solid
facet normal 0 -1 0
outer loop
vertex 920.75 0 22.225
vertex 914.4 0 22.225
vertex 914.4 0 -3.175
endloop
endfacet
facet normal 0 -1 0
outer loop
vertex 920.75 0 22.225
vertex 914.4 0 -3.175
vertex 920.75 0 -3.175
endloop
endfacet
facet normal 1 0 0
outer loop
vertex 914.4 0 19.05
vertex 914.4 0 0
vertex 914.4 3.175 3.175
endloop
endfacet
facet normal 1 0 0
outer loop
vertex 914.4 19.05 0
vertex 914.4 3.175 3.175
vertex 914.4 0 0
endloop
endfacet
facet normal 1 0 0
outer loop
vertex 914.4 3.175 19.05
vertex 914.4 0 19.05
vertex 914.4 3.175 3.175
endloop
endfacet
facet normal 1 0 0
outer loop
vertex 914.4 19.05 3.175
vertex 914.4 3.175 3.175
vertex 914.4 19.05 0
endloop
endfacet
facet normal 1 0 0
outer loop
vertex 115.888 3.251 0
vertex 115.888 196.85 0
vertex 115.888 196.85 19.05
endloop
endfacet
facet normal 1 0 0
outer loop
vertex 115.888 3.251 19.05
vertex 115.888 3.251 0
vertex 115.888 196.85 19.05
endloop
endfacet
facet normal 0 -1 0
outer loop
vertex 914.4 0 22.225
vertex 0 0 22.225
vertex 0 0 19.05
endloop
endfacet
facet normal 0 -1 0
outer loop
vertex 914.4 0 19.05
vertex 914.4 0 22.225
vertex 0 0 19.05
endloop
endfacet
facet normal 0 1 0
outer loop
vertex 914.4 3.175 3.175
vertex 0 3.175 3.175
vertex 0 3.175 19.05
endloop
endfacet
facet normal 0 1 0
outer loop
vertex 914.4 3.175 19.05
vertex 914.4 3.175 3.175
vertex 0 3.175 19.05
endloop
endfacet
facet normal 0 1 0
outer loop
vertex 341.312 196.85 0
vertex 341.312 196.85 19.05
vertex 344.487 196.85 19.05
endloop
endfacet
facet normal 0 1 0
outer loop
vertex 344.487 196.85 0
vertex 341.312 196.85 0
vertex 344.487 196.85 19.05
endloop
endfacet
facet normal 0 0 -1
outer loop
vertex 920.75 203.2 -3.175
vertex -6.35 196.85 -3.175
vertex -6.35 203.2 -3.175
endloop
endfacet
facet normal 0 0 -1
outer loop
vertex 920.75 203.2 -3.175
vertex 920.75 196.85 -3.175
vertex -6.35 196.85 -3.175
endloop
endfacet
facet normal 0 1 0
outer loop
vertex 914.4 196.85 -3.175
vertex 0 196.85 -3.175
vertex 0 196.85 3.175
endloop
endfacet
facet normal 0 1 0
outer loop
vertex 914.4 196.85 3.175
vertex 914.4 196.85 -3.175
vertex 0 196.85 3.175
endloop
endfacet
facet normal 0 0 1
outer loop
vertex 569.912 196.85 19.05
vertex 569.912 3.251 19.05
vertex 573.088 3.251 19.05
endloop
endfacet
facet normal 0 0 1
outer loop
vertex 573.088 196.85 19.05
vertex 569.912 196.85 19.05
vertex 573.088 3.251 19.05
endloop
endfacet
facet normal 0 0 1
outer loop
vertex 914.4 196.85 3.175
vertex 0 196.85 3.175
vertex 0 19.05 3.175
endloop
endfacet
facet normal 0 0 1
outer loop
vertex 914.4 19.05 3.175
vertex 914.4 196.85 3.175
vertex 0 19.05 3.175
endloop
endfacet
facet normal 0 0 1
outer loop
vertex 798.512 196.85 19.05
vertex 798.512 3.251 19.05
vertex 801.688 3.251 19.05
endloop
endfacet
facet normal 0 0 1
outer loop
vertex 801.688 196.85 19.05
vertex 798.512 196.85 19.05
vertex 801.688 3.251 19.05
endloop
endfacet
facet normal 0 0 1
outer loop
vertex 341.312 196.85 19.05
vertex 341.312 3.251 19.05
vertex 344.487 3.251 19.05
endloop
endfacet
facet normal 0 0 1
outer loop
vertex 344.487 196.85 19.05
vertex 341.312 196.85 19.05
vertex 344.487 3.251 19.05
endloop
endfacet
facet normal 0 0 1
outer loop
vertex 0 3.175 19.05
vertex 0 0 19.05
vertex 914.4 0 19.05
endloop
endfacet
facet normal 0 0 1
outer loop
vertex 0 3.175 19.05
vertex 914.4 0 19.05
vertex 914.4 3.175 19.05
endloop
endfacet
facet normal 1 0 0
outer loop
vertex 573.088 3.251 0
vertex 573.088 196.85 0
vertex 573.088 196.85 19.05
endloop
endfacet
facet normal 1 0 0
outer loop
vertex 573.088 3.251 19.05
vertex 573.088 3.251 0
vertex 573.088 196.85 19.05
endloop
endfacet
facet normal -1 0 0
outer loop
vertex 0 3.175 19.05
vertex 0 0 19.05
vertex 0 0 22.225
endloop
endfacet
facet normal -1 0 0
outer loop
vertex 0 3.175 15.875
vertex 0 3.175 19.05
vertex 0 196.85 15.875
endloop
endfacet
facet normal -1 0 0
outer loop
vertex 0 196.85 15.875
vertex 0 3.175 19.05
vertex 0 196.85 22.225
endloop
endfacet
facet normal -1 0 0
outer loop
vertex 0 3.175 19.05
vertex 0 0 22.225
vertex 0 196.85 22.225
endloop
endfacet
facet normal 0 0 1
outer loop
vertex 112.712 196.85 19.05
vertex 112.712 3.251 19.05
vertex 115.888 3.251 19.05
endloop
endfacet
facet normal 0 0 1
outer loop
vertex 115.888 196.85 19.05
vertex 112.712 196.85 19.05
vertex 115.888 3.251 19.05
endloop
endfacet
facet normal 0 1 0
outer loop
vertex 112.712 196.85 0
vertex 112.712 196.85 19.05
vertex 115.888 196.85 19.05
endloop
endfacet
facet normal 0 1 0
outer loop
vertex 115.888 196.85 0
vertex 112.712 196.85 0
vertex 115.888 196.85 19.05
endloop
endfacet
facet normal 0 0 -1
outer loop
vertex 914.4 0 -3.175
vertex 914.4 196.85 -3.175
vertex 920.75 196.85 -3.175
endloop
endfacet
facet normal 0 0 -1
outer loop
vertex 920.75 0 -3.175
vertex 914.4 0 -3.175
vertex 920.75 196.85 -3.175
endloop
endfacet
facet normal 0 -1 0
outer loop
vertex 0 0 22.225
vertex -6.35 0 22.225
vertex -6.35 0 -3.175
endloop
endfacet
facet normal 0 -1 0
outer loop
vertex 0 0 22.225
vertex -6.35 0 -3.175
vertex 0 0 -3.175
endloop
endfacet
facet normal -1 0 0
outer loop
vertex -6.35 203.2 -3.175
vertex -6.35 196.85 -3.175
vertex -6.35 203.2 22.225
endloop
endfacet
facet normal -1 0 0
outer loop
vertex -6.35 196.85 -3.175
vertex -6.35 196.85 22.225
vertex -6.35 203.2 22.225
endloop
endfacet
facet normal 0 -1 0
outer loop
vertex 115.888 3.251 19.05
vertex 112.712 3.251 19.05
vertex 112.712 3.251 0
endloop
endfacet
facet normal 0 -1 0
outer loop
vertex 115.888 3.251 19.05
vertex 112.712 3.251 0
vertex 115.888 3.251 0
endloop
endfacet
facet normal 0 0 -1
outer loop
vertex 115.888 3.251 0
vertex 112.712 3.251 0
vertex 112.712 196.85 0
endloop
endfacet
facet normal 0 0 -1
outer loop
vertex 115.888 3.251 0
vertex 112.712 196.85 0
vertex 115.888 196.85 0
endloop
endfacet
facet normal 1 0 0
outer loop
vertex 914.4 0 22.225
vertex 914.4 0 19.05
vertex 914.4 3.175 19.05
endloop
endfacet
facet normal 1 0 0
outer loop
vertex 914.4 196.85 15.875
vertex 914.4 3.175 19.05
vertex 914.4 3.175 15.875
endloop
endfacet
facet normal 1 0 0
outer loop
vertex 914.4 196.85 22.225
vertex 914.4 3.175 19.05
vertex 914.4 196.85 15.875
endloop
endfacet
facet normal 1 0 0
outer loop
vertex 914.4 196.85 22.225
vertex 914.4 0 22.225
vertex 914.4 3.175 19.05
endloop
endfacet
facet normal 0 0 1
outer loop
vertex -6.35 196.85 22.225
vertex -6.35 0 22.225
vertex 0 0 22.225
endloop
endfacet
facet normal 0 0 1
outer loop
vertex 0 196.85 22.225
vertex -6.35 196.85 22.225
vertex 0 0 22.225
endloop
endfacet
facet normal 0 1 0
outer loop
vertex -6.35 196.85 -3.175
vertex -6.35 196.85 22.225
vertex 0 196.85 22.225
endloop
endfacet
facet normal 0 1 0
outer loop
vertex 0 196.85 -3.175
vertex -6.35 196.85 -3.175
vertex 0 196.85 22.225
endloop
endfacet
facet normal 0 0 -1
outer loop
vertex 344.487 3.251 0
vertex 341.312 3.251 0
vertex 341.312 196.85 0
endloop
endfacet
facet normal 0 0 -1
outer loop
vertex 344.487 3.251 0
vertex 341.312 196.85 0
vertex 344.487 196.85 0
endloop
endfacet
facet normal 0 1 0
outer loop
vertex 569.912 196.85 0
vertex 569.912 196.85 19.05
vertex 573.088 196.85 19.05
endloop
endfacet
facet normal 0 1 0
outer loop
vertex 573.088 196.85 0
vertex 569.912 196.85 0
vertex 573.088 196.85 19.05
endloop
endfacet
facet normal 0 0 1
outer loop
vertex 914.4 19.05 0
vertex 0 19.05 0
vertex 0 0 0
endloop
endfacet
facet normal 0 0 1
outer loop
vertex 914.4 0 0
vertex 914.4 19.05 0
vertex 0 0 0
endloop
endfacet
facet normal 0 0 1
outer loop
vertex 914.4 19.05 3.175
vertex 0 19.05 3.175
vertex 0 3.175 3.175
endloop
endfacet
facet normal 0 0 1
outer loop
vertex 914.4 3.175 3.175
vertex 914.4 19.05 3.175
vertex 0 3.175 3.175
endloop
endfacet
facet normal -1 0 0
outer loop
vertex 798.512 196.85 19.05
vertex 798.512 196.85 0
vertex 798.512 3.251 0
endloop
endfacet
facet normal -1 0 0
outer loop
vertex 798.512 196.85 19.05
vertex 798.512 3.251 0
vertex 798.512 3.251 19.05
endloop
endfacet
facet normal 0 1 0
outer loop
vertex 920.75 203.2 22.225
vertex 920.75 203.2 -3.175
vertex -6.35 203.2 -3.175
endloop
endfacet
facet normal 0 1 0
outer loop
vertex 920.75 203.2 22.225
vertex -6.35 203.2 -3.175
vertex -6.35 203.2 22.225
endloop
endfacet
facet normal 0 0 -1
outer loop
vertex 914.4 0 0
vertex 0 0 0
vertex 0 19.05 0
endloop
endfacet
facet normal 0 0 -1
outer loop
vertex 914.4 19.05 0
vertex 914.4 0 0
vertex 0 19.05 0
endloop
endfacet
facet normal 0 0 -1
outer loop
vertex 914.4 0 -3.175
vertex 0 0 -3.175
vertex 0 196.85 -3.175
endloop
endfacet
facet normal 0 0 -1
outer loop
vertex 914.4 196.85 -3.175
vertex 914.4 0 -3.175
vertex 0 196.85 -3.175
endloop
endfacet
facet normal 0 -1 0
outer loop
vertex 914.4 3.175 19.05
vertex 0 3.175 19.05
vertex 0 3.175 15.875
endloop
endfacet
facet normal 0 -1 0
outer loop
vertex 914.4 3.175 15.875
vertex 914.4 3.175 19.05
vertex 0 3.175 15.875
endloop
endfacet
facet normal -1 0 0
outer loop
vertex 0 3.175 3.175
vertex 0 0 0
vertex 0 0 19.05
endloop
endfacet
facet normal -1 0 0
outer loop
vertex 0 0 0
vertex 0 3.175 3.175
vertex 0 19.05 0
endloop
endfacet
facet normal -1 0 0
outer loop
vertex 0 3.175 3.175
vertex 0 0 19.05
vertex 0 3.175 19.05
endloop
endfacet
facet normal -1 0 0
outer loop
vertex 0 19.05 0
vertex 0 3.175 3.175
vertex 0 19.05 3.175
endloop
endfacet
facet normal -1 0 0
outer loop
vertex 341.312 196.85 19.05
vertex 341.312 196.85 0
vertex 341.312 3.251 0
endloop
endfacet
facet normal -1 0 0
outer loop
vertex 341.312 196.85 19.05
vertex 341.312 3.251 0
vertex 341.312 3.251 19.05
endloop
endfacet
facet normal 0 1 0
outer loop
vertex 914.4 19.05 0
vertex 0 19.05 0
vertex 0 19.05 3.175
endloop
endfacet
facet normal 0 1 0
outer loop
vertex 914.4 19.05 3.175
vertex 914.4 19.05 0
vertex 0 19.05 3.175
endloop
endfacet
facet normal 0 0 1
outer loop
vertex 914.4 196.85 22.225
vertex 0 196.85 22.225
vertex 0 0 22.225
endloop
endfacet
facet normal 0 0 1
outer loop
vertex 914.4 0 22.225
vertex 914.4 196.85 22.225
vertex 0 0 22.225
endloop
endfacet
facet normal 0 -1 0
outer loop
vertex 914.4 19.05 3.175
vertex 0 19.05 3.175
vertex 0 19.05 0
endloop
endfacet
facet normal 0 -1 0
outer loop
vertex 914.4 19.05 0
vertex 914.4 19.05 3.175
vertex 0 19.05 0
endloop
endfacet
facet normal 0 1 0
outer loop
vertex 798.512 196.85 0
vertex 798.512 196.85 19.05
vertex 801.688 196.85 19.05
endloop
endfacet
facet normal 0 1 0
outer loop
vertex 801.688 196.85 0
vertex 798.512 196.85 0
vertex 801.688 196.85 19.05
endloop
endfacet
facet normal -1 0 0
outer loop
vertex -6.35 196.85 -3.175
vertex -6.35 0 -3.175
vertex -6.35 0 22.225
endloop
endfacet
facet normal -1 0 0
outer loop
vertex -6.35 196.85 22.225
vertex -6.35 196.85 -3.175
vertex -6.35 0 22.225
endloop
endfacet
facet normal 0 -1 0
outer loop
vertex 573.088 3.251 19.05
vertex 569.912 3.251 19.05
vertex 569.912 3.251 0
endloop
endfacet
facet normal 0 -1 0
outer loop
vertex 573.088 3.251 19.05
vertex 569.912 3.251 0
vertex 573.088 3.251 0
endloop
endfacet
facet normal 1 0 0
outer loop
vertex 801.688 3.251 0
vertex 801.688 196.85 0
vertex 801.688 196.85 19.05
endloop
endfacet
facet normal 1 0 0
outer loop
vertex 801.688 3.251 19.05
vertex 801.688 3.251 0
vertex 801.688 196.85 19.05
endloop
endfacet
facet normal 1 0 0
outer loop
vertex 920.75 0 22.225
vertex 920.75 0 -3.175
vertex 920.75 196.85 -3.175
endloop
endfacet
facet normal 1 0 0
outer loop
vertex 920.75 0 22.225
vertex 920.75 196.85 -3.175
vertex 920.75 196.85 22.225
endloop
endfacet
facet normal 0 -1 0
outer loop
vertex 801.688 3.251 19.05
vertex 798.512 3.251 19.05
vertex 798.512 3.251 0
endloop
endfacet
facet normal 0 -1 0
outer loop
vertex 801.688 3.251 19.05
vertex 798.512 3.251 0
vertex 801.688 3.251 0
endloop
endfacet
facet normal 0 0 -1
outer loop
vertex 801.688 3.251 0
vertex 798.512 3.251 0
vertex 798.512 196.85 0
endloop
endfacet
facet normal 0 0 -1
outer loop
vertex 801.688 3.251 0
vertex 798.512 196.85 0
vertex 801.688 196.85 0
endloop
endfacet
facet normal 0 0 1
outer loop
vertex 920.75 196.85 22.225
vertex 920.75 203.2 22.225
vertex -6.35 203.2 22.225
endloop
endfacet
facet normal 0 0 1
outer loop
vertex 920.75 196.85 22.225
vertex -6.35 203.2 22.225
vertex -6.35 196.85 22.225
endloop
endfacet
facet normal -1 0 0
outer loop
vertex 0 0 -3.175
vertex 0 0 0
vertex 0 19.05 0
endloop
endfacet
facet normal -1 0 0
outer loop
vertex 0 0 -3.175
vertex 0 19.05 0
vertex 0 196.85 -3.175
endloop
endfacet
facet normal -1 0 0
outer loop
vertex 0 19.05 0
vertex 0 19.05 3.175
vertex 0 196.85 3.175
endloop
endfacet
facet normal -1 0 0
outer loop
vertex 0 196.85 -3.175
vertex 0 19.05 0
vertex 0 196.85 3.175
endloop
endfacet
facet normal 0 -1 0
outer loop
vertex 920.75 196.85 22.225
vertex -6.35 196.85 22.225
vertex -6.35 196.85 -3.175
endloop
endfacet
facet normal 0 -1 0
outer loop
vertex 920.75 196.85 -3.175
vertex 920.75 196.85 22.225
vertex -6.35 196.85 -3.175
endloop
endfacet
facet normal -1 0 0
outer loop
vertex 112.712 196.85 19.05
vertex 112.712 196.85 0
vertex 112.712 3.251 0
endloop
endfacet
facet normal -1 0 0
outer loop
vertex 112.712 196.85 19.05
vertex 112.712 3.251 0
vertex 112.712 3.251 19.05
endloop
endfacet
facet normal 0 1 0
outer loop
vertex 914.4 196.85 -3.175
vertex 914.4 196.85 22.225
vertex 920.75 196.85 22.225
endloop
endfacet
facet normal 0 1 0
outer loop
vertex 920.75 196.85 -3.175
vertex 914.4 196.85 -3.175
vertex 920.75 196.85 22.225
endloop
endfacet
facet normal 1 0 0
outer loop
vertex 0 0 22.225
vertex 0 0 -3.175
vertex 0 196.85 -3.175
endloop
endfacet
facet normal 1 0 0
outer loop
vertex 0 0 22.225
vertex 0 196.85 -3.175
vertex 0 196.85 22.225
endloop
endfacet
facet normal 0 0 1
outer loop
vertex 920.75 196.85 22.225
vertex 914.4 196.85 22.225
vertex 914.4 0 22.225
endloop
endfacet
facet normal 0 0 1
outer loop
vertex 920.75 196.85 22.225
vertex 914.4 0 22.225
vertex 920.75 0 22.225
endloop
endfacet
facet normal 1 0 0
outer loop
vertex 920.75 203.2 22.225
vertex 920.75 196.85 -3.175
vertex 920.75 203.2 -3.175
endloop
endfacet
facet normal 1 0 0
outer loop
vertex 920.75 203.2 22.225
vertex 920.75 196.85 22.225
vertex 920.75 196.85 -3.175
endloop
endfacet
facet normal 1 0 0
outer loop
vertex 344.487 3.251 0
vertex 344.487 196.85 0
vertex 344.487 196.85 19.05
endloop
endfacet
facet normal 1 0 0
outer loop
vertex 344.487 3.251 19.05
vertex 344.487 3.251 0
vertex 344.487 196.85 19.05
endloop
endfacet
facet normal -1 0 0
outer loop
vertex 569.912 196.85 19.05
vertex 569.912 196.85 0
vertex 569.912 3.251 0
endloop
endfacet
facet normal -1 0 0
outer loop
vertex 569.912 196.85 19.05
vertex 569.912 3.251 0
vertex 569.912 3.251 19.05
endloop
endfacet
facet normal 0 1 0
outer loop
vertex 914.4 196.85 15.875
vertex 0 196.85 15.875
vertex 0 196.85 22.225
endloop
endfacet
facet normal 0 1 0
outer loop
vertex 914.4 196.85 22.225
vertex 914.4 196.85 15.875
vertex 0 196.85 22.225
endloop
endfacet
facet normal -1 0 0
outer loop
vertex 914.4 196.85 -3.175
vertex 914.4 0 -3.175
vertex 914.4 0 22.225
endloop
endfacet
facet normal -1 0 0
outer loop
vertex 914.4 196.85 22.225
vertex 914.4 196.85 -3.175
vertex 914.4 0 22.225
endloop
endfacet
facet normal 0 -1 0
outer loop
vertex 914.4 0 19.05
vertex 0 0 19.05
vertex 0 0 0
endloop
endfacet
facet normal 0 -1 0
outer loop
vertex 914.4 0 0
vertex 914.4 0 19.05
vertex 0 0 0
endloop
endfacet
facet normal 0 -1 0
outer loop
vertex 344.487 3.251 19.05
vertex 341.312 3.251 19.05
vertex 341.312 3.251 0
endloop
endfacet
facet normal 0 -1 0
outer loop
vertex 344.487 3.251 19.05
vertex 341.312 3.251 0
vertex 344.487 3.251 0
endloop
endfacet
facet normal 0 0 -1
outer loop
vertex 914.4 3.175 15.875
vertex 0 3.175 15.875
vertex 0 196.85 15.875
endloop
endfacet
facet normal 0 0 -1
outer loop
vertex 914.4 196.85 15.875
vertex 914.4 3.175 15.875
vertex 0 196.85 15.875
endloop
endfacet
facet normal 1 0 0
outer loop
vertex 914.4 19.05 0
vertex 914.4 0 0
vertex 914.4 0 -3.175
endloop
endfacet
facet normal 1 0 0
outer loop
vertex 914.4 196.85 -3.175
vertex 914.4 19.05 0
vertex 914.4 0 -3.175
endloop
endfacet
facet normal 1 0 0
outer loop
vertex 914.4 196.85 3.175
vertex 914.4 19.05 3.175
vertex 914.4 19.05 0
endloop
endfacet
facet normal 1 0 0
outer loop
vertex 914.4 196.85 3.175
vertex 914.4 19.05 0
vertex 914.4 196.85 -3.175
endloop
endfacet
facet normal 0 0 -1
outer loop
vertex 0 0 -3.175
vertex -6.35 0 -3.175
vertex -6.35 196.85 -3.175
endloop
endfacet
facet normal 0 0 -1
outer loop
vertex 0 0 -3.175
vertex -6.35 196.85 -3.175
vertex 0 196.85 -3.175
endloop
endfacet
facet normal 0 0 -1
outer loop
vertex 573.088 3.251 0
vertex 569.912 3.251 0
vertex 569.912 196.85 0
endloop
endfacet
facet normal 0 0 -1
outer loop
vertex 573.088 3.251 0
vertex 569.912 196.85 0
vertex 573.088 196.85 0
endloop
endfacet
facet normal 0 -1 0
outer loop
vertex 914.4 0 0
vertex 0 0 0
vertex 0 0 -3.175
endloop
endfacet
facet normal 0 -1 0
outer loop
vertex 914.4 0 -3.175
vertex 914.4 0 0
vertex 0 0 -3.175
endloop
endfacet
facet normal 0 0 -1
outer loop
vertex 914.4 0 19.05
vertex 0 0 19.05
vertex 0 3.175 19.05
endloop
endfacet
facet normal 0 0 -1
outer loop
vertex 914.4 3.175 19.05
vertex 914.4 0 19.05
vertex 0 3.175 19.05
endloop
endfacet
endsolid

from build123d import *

# Parameters (mm, degrees)
F0_W          = 3.175
F0_H          = 3.175
F1_DEPTH      = 914.4
F2_DEPTH      = 914.4
F3_DEPTH      = 920.75
F3_DEPTH_BACK = 6.35
F4_W          = 6.35
F4_H          = 25.4
F5_DEPTH      = 196.85
F7_W          = 3.175
F7_H          = 19.05
F8_DEPTH      = 193.5988


with BuildPart() as f1:
    # F0 (on Right) → F1 (new body)
    with BuildSketch(Plane.YZ):
        Polygon((0, 15.875), (0, 0), (19.05, 0), (19.05, 3.175), (3.175, 3.175), (3.175, 15.875), align=None)
        with Locations((1.5875, 17.4625)):
            Rectangle(F0_W, F0_H)
    extrude(amount=F1_DEPTH)


with BuildPart() as f2:
    # F0 (on Right) → F2 (new body)
    with BuildSketch(Plane.YZ):
        Polygon((0, 22.225), (0, 19.05), (3.175, 19.05), (3.175, 15.875), (196.85, 15.875), (196.85, 22.225), align=None)
        Polygon((19.05, 0), (0, 0), (0, -3.175), (196.85, -3.175), (196.85, 3.175), (19.05, 3.175), align=None)
    extrude(amount=F2_DEPTH)


with BuildPart() as f3:
    # F0 (on Right) → F3 (new body, two sides)
    with BuildSketch(Plane.YZ) as f3_sk:
        Polygon((196.85, 3.175), (196.85, -3.175), (203.2, -3.175), (203.2, 22.225), (196.85, 22.225), (196.85, 15.875), align=None)
    extrude(amount=F3_DEPTH)
    extrude(f3_sk.sketch, amount=-F3_DEPTH_BACK)


with BuildPart() as f5:
    # F4 (on Front) → F5 (new body, through all)
    with BuildSketch(Plane.XZ):
        with Locations((917.575, 9.525)):
            Rectangle(F4_W, F4_H)
        with Locations((-3.175, 9.525)):
            Rectangle(F4_W, F4_H)
    extrude(amount=-F5_DEPTH)


with BuildPart() as f8:
    # F7 (on offset) → F8 (new body)
    with BuildSketch(Plane.XZ.offset(-3.2512)):
        with Locations((114.3, 9.525)):
            Rectangle(F7_W, F7_H)
        with Locations((342.9, 9.525)):
            Rectangle(F7_W, F7_H)
        with Locations((571.5, 9.525)):
            Rectangle(F7_W, F7_H)
        with Locations((800.1, 9.525)):
            Rectangle(F7_W, F7_H)
    extrude(amount=-F8_DEPTH)


solid = Compound([f1.part, f2.part, f3.part, f5.part, f8.part])
